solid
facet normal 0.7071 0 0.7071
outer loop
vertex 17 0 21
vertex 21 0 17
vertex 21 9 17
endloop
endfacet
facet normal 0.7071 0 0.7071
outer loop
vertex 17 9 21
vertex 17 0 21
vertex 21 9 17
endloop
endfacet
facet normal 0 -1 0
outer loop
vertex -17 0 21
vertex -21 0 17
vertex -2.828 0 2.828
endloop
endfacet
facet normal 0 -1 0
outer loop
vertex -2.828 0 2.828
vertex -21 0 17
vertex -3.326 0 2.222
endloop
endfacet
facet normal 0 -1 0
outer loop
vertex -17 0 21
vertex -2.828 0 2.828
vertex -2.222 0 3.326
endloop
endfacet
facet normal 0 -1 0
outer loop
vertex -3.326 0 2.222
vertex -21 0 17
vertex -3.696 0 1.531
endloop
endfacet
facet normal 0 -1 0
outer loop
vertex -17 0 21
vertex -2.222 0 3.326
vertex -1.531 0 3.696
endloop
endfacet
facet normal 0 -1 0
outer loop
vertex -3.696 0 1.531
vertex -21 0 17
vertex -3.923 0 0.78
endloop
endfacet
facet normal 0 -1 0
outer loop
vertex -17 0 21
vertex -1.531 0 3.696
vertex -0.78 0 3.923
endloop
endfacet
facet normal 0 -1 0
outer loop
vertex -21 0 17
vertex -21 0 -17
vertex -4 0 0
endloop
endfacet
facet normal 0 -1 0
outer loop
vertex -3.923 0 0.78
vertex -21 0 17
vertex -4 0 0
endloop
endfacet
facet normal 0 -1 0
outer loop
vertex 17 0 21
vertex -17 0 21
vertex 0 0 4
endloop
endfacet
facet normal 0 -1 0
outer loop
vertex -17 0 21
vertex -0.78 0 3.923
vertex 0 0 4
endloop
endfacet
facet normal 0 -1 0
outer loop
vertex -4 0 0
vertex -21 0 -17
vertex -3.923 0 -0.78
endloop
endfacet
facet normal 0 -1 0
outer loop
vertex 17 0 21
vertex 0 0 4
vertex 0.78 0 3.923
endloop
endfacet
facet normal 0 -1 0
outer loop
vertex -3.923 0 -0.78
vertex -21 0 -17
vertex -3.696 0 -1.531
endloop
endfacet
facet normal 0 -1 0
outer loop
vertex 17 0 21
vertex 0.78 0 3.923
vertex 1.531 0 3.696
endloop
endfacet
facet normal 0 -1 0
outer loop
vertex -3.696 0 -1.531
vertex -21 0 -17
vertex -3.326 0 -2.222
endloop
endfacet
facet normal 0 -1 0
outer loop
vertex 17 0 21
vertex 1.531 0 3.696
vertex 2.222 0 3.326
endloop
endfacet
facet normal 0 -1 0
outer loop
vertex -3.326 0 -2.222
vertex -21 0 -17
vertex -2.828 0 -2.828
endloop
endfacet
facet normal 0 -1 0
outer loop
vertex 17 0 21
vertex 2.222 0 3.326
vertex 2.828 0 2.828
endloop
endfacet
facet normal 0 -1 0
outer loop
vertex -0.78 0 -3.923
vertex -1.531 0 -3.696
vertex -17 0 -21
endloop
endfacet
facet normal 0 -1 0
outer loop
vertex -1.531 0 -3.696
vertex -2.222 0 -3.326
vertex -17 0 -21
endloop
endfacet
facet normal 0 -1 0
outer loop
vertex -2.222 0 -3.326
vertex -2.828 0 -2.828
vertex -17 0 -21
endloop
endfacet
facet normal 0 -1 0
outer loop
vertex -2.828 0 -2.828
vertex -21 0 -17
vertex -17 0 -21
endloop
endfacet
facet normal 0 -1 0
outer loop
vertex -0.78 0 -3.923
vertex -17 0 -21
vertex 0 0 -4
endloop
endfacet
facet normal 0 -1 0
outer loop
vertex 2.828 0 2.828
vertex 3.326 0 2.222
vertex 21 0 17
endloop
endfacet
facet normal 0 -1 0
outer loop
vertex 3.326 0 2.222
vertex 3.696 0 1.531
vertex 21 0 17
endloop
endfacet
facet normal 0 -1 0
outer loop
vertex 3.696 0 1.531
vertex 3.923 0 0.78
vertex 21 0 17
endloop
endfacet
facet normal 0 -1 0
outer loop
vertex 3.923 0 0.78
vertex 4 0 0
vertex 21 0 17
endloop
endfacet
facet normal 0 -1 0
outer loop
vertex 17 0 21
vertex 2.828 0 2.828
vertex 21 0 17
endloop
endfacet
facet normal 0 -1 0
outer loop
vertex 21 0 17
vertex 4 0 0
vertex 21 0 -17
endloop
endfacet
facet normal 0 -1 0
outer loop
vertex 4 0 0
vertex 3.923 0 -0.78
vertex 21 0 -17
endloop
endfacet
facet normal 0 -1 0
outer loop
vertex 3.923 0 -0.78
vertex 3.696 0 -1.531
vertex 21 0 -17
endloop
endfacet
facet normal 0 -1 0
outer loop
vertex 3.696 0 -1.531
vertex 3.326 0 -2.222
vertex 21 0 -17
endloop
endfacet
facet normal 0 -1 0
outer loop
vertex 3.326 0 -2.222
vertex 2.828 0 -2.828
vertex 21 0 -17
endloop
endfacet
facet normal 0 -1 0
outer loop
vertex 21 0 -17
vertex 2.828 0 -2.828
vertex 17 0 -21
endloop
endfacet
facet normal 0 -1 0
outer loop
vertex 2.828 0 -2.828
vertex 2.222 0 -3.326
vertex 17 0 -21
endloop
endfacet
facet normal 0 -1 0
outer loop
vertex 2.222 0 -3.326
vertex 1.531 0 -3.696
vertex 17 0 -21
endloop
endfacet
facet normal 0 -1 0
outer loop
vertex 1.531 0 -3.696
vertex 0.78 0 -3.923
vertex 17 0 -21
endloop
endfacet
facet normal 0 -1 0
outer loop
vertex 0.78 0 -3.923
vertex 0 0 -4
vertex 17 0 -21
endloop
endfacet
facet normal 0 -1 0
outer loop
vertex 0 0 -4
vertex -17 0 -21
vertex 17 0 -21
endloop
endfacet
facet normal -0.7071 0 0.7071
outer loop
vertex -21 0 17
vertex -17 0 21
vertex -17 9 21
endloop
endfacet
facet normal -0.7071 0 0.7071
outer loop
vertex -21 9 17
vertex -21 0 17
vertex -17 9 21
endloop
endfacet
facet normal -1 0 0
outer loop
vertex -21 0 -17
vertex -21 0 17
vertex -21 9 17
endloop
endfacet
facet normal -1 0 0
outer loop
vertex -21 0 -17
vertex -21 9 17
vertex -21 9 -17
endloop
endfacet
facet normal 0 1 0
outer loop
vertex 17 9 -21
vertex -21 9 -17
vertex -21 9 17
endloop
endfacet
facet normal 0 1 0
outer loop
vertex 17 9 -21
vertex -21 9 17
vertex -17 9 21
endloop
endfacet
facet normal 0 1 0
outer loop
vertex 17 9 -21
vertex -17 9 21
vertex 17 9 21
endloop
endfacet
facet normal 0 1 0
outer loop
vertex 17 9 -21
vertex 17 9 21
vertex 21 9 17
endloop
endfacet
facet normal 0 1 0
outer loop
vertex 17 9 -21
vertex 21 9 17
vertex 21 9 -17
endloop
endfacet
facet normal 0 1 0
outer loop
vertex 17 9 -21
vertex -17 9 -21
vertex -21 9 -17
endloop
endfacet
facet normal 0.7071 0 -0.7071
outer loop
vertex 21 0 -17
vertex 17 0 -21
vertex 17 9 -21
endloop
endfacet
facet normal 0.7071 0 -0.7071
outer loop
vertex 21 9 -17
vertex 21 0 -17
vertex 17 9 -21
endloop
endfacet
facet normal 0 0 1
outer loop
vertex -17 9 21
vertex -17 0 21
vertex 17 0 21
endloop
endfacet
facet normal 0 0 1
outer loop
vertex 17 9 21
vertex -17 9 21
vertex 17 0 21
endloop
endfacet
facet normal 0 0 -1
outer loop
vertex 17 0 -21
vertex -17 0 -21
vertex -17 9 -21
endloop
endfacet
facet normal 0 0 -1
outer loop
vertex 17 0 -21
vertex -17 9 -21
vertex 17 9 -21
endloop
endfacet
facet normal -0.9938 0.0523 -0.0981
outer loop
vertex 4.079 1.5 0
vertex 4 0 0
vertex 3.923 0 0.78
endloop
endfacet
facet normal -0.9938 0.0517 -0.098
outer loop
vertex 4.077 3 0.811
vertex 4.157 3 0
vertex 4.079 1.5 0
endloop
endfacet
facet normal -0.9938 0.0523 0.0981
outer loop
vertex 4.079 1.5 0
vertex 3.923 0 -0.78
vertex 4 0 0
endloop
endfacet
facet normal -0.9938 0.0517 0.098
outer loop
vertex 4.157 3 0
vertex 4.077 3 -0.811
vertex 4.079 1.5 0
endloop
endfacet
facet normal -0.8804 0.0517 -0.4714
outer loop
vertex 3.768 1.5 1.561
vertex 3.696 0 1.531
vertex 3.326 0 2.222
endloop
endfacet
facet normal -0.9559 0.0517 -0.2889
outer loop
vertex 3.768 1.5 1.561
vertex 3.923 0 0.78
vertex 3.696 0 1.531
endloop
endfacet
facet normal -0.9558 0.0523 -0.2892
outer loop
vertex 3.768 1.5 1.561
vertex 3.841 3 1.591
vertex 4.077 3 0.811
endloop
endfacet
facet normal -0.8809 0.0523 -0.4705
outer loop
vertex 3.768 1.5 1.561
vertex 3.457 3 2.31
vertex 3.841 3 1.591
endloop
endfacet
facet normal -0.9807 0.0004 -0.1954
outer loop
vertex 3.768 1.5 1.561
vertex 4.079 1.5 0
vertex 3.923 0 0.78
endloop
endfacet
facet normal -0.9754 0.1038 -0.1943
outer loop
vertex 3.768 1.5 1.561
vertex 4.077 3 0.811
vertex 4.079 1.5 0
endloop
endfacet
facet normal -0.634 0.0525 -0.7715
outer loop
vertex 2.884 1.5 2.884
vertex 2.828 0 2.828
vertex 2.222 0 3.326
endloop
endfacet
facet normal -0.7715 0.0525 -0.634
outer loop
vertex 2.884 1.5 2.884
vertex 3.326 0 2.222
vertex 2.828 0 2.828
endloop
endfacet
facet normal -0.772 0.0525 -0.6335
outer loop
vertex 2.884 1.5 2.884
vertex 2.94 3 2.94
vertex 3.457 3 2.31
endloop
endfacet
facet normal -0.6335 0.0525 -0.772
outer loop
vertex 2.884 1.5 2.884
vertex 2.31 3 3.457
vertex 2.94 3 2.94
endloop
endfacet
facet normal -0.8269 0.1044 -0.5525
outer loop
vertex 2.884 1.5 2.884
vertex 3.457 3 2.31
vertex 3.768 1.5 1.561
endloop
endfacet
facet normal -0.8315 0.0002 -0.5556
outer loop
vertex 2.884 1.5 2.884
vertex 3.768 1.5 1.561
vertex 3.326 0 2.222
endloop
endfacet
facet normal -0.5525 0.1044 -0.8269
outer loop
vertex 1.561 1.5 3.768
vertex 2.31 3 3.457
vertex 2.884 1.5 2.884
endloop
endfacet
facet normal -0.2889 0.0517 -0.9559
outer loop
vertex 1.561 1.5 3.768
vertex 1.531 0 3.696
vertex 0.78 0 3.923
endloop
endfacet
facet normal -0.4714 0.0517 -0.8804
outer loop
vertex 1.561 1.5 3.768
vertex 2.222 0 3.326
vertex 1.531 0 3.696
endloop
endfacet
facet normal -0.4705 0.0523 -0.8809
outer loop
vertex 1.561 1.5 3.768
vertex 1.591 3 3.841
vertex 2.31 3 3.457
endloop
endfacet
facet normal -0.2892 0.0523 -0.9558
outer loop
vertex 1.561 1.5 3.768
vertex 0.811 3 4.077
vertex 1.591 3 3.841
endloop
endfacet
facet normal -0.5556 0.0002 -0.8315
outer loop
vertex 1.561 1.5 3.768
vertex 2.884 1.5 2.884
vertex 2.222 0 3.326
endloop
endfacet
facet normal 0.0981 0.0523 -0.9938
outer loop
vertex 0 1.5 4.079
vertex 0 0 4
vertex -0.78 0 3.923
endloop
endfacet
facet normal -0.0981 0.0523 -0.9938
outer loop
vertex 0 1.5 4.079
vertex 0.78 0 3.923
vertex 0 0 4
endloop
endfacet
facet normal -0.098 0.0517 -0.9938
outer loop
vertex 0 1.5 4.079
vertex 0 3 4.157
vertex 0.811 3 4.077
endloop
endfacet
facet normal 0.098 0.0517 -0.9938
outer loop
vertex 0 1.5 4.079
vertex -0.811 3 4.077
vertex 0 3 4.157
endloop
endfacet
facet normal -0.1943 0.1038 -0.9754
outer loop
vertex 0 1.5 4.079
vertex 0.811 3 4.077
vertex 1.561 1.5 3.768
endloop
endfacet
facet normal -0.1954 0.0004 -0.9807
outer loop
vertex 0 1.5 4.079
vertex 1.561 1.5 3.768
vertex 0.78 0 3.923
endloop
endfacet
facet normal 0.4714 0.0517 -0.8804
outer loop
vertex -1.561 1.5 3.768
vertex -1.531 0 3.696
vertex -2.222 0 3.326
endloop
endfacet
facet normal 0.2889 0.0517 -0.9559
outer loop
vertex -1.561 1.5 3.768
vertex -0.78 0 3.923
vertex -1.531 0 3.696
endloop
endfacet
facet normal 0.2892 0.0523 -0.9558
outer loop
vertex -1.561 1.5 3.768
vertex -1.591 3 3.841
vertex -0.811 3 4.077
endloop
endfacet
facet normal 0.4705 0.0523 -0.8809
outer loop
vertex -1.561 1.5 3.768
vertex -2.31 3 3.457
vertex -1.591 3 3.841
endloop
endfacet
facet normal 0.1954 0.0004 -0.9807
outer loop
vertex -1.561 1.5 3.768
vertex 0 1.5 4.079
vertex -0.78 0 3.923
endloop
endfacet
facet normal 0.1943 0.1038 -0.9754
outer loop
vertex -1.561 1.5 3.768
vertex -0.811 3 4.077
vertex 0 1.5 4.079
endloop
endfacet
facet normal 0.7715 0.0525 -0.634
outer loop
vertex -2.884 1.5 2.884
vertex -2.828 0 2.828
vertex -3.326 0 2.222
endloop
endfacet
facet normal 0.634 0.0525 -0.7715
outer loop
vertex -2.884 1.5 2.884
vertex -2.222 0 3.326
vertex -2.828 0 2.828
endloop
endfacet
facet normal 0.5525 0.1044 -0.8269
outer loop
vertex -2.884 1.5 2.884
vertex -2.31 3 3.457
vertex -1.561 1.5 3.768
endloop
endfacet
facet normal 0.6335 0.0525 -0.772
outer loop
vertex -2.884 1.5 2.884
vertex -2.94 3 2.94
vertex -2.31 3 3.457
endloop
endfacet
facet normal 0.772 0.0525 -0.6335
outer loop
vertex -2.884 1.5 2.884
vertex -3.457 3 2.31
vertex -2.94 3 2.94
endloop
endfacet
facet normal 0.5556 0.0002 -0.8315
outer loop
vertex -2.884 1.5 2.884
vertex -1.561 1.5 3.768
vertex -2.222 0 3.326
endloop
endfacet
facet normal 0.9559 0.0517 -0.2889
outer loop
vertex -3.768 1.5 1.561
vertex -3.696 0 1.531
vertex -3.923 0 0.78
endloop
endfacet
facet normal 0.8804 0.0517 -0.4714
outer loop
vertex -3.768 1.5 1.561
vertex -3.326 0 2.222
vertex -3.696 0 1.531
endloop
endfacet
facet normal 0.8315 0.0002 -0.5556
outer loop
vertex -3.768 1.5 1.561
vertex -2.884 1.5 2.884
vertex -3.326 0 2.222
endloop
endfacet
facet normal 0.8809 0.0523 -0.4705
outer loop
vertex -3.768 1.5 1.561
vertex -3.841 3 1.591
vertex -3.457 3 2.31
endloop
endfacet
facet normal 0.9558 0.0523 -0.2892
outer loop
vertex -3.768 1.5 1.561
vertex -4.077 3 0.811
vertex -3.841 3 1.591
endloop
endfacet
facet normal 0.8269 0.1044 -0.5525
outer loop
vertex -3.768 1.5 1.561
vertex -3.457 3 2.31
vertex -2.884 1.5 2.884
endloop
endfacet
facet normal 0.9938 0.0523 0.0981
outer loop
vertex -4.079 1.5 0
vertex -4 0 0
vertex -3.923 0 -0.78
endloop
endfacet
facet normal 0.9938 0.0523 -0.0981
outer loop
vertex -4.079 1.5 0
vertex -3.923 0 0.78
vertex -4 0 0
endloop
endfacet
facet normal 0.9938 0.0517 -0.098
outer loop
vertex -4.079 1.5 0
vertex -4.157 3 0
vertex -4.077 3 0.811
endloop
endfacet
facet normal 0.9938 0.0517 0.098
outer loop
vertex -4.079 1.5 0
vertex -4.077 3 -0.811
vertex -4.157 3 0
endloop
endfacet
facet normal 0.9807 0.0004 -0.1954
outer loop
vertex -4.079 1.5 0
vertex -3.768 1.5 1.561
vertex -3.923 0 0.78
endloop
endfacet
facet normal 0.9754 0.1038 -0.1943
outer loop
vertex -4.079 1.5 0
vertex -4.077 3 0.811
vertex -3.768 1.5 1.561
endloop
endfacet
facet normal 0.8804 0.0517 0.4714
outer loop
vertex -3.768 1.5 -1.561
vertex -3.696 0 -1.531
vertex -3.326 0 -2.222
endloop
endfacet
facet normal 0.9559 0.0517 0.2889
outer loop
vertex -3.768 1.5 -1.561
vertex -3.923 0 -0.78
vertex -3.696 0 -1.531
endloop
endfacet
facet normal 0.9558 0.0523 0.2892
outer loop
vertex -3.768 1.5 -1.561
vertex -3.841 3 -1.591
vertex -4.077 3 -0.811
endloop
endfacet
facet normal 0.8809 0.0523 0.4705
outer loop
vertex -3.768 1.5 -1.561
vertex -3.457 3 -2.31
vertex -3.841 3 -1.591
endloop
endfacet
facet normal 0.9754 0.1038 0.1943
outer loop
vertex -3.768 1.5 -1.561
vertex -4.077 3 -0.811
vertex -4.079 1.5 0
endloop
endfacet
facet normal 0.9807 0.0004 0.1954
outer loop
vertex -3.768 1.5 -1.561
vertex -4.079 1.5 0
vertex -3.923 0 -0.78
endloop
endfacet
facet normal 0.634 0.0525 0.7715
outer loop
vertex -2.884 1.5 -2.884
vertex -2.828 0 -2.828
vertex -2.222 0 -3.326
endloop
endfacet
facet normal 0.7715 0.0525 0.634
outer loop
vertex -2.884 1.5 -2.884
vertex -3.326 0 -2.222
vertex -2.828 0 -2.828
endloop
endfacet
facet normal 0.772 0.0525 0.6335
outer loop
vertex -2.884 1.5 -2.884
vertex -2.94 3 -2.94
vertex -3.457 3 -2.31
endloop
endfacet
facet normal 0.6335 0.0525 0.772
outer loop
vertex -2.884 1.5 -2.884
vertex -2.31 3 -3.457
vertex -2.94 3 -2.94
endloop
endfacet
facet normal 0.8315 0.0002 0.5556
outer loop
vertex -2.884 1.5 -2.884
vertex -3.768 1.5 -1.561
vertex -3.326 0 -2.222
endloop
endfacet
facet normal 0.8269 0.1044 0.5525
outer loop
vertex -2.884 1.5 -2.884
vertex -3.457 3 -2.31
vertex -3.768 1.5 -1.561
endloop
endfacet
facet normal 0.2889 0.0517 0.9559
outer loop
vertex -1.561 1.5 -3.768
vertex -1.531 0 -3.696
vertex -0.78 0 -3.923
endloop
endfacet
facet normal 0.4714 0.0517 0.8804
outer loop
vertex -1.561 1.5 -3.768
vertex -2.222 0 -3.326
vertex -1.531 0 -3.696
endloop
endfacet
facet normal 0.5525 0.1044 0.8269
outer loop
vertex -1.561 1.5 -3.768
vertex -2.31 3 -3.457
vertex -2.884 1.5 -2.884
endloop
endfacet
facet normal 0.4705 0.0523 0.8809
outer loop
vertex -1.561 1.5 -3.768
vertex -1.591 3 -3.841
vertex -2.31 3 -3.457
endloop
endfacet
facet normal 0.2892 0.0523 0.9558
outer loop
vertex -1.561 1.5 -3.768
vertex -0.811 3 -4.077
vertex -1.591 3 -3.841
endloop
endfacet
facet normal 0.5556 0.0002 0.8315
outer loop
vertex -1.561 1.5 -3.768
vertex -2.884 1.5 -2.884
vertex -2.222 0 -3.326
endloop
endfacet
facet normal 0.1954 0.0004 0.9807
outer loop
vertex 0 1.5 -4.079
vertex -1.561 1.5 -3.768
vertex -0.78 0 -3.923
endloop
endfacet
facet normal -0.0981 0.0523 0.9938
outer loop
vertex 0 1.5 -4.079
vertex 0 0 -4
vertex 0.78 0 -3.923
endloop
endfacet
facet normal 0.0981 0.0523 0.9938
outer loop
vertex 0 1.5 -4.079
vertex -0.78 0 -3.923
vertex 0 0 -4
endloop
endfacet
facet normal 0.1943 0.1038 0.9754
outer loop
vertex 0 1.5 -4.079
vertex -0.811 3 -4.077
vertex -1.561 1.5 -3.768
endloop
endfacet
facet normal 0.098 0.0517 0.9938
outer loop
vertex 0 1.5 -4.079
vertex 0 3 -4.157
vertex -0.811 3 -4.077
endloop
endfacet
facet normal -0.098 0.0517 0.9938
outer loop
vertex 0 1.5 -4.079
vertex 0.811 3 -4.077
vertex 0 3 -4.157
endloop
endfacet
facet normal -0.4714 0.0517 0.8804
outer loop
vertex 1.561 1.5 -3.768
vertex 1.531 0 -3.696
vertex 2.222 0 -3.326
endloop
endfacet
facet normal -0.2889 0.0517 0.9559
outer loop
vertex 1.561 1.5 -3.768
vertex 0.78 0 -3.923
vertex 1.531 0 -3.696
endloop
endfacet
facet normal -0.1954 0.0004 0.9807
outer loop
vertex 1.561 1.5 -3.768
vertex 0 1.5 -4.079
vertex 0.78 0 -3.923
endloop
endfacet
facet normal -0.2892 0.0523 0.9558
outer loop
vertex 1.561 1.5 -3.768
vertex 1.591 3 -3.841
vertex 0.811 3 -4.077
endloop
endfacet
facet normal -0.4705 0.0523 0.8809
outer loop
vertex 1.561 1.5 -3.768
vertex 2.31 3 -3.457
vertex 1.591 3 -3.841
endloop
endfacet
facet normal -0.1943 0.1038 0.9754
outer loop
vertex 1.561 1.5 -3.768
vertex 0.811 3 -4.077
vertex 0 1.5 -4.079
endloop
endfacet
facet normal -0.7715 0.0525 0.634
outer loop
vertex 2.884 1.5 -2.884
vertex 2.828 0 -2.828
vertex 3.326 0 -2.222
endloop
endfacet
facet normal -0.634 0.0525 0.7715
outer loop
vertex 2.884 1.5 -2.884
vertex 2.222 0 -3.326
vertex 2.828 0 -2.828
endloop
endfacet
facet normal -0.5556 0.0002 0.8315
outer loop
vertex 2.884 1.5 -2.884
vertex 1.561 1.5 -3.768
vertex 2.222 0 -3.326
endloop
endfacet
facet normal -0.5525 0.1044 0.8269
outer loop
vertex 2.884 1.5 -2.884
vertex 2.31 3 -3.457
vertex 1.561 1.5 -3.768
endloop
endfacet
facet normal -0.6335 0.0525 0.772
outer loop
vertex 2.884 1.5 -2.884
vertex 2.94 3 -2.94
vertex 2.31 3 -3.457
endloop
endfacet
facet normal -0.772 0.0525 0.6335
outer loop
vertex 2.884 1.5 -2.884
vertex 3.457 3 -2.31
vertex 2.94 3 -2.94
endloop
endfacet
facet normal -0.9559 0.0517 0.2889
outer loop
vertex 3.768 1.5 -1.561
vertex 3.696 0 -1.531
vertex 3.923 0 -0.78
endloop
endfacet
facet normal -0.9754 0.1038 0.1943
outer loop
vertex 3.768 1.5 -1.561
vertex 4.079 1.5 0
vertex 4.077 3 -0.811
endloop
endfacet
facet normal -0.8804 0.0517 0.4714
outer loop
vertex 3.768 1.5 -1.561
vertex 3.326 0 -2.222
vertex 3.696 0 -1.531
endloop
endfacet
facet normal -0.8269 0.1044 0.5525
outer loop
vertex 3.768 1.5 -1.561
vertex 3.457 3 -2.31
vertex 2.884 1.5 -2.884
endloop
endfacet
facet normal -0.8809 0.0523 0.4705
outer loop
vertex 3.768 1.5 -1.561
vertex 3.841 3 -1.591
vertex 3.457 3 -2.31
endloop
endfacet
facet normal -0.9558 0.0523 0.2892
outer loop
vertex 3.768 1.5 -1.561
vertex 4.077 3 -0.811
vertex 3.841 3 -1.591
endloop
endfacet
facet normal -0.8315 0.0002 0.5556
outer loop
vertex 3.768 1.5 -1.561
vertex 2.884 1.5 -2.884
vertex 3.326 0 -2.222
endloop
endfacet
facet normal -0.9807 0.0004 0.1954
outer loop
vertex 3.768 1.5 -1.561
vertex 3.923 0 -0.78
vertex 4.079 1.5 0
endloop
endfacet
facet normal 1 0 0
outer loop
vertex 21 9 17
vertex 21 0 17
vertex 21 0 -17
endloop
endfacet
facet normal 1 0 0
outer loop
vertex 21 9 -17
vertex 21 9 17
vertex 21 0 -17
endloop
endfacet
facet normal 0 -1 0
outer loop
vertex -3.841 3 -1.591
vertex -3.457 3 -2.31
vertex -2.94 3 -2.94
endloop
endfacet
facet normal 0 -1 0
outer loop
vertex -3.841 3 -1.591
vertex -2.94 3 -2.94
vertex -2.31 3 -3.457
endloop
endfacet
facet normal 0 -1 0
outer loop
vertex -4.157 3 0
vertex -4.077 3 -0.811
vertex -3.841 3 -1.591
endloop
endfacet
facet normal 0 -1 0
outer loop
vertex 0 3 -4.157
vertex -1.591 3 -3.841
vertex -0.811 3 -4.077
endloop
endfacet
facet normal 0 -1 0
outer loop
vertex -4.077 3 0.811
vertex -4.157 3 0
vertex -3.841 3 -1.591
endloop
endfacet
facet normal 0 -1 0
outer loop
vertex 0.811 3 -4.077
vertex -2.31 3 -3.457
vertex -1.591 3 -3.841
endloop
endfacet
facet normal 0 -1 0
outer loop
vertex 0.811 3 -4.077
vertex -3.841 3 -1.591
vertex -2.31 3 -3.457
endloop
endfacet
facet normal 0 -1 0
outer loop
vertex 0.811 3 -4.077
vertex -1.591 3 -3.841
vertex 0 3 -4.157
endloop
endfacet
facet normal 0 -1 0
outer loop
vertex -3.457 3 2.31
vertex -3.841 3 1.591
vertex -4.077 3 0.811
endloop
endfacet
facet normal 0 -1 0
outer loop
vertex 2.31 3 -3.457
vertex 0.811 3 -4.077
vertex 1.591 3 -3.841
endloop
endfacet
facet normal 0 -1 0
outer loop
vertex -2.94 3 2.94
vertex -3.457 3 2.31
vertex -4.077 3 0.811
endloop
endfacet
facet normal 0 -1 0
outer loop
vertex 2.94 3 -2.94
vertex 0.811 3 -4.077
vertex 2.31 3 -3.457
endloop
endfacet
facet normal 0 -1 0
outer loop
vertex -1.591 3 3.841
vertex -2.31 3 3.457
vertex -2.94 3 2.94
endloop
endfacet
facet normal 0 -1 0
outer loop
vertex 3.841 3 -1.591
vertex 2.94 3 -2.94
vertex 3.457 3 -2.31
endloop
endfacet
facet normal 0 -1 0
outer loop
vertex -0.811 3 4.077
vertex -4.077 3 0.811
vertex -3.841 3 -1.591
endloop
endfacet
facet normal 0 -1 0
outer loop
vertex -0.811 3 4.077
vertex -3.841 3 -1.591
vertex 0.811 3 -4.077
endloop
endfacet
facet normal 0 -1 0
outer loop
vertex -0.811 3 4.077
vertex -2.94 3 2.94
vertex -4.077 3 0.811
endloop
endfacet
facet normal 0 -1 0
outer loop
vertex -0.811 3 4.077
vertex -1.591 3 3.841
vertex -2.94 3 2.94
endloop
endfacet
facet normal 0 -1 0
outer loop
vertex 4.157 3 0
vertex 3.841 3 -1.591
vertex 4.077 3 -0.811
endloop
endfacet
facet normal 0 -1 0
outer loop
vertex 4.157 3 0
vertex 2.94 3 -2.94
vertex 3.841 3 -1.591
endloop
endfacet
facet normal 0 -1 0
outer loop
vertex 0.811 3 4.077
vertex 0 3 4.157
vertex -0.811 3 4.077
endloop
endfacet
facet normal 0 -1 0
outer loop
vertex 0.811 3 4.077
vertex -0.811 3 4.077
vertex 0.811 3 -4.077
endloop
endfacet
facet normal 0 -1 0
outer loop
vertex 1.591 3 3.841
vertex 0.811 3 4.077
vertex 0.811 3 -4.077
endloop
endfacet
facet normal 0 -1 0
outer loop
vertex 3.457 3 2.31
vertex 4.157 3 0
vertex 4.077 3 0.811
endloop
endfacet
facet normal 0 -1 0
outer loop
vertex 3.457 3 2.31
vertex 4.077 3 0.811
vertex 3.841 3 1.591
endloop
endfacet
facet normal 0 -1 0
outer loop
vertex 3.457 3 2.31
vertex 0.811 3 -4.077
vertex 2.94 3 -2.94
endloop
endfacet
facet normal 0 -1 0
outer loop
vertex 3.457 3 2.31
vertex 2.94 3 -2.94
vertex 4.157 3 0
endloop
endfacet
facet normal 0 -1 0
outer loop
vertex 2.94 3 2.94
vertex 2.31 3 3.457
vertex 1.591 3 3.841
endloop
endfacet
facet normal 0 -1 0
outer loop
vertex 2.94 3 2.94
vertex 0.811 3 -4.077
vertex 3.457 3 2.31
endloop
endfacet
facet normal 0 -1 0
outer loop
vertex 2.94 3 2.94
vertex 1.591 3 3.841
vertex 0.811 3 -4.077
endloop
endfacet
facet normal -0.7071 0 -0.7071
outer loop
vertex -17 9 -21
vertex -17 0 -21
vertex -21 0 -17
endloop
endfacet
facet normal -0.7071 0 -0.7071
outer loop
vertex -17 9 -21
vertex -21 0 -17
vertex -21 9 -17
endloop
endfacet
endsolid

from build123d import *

# Parameters (mm, degrees)
SKETCH1_W           = 42
SKETCH1_H           = 42
BOSS_EXTRUDE1_DEPTH = 9
CHAMFER1_SIZE       = 4
SKETCH2_R           = 4
CUT_EXTRUDE2_DEPTH  = 3
CUT_EXTRUDE2_TAPER  = -3


with BuildPart() as part:
    # Sketch1 → Boss-Extrude1 (new body)
    with BuildSketch(Plane(origin=(0, 0, 0), x_dir=(1, 0, 0), z_dir=(0, 1, 0))):
        Rectangle(SKETCH1_W, SKETCH1_H)
    extrude(amount=BOSS_EXTRUDE1_DEPTH)

    # Chamfer1
    chamfer1_edges = [part.edges().sort_by_distance(p)[0] for p in [
        (-21, 4.5, -21),
        (21, 4.5, -21),
        (21, 4.5, 21),
        (-21, 4.5, 21),
    ]]
    chamfer(chamfer1_edges, length=CHAMFER1_SIZE)

    # Sketch2 → Cut-Extrude2 (cut)
    with BuildSketch(Plane.XZ):
        Circle(SKETCH2_R)
    extrude(amount=-CUT_EXTRUDE2_DEPTH, taper=CUT_EXTRUDE2_TAPER, mode=Mode.SUBTRACT)


solid = part.part
